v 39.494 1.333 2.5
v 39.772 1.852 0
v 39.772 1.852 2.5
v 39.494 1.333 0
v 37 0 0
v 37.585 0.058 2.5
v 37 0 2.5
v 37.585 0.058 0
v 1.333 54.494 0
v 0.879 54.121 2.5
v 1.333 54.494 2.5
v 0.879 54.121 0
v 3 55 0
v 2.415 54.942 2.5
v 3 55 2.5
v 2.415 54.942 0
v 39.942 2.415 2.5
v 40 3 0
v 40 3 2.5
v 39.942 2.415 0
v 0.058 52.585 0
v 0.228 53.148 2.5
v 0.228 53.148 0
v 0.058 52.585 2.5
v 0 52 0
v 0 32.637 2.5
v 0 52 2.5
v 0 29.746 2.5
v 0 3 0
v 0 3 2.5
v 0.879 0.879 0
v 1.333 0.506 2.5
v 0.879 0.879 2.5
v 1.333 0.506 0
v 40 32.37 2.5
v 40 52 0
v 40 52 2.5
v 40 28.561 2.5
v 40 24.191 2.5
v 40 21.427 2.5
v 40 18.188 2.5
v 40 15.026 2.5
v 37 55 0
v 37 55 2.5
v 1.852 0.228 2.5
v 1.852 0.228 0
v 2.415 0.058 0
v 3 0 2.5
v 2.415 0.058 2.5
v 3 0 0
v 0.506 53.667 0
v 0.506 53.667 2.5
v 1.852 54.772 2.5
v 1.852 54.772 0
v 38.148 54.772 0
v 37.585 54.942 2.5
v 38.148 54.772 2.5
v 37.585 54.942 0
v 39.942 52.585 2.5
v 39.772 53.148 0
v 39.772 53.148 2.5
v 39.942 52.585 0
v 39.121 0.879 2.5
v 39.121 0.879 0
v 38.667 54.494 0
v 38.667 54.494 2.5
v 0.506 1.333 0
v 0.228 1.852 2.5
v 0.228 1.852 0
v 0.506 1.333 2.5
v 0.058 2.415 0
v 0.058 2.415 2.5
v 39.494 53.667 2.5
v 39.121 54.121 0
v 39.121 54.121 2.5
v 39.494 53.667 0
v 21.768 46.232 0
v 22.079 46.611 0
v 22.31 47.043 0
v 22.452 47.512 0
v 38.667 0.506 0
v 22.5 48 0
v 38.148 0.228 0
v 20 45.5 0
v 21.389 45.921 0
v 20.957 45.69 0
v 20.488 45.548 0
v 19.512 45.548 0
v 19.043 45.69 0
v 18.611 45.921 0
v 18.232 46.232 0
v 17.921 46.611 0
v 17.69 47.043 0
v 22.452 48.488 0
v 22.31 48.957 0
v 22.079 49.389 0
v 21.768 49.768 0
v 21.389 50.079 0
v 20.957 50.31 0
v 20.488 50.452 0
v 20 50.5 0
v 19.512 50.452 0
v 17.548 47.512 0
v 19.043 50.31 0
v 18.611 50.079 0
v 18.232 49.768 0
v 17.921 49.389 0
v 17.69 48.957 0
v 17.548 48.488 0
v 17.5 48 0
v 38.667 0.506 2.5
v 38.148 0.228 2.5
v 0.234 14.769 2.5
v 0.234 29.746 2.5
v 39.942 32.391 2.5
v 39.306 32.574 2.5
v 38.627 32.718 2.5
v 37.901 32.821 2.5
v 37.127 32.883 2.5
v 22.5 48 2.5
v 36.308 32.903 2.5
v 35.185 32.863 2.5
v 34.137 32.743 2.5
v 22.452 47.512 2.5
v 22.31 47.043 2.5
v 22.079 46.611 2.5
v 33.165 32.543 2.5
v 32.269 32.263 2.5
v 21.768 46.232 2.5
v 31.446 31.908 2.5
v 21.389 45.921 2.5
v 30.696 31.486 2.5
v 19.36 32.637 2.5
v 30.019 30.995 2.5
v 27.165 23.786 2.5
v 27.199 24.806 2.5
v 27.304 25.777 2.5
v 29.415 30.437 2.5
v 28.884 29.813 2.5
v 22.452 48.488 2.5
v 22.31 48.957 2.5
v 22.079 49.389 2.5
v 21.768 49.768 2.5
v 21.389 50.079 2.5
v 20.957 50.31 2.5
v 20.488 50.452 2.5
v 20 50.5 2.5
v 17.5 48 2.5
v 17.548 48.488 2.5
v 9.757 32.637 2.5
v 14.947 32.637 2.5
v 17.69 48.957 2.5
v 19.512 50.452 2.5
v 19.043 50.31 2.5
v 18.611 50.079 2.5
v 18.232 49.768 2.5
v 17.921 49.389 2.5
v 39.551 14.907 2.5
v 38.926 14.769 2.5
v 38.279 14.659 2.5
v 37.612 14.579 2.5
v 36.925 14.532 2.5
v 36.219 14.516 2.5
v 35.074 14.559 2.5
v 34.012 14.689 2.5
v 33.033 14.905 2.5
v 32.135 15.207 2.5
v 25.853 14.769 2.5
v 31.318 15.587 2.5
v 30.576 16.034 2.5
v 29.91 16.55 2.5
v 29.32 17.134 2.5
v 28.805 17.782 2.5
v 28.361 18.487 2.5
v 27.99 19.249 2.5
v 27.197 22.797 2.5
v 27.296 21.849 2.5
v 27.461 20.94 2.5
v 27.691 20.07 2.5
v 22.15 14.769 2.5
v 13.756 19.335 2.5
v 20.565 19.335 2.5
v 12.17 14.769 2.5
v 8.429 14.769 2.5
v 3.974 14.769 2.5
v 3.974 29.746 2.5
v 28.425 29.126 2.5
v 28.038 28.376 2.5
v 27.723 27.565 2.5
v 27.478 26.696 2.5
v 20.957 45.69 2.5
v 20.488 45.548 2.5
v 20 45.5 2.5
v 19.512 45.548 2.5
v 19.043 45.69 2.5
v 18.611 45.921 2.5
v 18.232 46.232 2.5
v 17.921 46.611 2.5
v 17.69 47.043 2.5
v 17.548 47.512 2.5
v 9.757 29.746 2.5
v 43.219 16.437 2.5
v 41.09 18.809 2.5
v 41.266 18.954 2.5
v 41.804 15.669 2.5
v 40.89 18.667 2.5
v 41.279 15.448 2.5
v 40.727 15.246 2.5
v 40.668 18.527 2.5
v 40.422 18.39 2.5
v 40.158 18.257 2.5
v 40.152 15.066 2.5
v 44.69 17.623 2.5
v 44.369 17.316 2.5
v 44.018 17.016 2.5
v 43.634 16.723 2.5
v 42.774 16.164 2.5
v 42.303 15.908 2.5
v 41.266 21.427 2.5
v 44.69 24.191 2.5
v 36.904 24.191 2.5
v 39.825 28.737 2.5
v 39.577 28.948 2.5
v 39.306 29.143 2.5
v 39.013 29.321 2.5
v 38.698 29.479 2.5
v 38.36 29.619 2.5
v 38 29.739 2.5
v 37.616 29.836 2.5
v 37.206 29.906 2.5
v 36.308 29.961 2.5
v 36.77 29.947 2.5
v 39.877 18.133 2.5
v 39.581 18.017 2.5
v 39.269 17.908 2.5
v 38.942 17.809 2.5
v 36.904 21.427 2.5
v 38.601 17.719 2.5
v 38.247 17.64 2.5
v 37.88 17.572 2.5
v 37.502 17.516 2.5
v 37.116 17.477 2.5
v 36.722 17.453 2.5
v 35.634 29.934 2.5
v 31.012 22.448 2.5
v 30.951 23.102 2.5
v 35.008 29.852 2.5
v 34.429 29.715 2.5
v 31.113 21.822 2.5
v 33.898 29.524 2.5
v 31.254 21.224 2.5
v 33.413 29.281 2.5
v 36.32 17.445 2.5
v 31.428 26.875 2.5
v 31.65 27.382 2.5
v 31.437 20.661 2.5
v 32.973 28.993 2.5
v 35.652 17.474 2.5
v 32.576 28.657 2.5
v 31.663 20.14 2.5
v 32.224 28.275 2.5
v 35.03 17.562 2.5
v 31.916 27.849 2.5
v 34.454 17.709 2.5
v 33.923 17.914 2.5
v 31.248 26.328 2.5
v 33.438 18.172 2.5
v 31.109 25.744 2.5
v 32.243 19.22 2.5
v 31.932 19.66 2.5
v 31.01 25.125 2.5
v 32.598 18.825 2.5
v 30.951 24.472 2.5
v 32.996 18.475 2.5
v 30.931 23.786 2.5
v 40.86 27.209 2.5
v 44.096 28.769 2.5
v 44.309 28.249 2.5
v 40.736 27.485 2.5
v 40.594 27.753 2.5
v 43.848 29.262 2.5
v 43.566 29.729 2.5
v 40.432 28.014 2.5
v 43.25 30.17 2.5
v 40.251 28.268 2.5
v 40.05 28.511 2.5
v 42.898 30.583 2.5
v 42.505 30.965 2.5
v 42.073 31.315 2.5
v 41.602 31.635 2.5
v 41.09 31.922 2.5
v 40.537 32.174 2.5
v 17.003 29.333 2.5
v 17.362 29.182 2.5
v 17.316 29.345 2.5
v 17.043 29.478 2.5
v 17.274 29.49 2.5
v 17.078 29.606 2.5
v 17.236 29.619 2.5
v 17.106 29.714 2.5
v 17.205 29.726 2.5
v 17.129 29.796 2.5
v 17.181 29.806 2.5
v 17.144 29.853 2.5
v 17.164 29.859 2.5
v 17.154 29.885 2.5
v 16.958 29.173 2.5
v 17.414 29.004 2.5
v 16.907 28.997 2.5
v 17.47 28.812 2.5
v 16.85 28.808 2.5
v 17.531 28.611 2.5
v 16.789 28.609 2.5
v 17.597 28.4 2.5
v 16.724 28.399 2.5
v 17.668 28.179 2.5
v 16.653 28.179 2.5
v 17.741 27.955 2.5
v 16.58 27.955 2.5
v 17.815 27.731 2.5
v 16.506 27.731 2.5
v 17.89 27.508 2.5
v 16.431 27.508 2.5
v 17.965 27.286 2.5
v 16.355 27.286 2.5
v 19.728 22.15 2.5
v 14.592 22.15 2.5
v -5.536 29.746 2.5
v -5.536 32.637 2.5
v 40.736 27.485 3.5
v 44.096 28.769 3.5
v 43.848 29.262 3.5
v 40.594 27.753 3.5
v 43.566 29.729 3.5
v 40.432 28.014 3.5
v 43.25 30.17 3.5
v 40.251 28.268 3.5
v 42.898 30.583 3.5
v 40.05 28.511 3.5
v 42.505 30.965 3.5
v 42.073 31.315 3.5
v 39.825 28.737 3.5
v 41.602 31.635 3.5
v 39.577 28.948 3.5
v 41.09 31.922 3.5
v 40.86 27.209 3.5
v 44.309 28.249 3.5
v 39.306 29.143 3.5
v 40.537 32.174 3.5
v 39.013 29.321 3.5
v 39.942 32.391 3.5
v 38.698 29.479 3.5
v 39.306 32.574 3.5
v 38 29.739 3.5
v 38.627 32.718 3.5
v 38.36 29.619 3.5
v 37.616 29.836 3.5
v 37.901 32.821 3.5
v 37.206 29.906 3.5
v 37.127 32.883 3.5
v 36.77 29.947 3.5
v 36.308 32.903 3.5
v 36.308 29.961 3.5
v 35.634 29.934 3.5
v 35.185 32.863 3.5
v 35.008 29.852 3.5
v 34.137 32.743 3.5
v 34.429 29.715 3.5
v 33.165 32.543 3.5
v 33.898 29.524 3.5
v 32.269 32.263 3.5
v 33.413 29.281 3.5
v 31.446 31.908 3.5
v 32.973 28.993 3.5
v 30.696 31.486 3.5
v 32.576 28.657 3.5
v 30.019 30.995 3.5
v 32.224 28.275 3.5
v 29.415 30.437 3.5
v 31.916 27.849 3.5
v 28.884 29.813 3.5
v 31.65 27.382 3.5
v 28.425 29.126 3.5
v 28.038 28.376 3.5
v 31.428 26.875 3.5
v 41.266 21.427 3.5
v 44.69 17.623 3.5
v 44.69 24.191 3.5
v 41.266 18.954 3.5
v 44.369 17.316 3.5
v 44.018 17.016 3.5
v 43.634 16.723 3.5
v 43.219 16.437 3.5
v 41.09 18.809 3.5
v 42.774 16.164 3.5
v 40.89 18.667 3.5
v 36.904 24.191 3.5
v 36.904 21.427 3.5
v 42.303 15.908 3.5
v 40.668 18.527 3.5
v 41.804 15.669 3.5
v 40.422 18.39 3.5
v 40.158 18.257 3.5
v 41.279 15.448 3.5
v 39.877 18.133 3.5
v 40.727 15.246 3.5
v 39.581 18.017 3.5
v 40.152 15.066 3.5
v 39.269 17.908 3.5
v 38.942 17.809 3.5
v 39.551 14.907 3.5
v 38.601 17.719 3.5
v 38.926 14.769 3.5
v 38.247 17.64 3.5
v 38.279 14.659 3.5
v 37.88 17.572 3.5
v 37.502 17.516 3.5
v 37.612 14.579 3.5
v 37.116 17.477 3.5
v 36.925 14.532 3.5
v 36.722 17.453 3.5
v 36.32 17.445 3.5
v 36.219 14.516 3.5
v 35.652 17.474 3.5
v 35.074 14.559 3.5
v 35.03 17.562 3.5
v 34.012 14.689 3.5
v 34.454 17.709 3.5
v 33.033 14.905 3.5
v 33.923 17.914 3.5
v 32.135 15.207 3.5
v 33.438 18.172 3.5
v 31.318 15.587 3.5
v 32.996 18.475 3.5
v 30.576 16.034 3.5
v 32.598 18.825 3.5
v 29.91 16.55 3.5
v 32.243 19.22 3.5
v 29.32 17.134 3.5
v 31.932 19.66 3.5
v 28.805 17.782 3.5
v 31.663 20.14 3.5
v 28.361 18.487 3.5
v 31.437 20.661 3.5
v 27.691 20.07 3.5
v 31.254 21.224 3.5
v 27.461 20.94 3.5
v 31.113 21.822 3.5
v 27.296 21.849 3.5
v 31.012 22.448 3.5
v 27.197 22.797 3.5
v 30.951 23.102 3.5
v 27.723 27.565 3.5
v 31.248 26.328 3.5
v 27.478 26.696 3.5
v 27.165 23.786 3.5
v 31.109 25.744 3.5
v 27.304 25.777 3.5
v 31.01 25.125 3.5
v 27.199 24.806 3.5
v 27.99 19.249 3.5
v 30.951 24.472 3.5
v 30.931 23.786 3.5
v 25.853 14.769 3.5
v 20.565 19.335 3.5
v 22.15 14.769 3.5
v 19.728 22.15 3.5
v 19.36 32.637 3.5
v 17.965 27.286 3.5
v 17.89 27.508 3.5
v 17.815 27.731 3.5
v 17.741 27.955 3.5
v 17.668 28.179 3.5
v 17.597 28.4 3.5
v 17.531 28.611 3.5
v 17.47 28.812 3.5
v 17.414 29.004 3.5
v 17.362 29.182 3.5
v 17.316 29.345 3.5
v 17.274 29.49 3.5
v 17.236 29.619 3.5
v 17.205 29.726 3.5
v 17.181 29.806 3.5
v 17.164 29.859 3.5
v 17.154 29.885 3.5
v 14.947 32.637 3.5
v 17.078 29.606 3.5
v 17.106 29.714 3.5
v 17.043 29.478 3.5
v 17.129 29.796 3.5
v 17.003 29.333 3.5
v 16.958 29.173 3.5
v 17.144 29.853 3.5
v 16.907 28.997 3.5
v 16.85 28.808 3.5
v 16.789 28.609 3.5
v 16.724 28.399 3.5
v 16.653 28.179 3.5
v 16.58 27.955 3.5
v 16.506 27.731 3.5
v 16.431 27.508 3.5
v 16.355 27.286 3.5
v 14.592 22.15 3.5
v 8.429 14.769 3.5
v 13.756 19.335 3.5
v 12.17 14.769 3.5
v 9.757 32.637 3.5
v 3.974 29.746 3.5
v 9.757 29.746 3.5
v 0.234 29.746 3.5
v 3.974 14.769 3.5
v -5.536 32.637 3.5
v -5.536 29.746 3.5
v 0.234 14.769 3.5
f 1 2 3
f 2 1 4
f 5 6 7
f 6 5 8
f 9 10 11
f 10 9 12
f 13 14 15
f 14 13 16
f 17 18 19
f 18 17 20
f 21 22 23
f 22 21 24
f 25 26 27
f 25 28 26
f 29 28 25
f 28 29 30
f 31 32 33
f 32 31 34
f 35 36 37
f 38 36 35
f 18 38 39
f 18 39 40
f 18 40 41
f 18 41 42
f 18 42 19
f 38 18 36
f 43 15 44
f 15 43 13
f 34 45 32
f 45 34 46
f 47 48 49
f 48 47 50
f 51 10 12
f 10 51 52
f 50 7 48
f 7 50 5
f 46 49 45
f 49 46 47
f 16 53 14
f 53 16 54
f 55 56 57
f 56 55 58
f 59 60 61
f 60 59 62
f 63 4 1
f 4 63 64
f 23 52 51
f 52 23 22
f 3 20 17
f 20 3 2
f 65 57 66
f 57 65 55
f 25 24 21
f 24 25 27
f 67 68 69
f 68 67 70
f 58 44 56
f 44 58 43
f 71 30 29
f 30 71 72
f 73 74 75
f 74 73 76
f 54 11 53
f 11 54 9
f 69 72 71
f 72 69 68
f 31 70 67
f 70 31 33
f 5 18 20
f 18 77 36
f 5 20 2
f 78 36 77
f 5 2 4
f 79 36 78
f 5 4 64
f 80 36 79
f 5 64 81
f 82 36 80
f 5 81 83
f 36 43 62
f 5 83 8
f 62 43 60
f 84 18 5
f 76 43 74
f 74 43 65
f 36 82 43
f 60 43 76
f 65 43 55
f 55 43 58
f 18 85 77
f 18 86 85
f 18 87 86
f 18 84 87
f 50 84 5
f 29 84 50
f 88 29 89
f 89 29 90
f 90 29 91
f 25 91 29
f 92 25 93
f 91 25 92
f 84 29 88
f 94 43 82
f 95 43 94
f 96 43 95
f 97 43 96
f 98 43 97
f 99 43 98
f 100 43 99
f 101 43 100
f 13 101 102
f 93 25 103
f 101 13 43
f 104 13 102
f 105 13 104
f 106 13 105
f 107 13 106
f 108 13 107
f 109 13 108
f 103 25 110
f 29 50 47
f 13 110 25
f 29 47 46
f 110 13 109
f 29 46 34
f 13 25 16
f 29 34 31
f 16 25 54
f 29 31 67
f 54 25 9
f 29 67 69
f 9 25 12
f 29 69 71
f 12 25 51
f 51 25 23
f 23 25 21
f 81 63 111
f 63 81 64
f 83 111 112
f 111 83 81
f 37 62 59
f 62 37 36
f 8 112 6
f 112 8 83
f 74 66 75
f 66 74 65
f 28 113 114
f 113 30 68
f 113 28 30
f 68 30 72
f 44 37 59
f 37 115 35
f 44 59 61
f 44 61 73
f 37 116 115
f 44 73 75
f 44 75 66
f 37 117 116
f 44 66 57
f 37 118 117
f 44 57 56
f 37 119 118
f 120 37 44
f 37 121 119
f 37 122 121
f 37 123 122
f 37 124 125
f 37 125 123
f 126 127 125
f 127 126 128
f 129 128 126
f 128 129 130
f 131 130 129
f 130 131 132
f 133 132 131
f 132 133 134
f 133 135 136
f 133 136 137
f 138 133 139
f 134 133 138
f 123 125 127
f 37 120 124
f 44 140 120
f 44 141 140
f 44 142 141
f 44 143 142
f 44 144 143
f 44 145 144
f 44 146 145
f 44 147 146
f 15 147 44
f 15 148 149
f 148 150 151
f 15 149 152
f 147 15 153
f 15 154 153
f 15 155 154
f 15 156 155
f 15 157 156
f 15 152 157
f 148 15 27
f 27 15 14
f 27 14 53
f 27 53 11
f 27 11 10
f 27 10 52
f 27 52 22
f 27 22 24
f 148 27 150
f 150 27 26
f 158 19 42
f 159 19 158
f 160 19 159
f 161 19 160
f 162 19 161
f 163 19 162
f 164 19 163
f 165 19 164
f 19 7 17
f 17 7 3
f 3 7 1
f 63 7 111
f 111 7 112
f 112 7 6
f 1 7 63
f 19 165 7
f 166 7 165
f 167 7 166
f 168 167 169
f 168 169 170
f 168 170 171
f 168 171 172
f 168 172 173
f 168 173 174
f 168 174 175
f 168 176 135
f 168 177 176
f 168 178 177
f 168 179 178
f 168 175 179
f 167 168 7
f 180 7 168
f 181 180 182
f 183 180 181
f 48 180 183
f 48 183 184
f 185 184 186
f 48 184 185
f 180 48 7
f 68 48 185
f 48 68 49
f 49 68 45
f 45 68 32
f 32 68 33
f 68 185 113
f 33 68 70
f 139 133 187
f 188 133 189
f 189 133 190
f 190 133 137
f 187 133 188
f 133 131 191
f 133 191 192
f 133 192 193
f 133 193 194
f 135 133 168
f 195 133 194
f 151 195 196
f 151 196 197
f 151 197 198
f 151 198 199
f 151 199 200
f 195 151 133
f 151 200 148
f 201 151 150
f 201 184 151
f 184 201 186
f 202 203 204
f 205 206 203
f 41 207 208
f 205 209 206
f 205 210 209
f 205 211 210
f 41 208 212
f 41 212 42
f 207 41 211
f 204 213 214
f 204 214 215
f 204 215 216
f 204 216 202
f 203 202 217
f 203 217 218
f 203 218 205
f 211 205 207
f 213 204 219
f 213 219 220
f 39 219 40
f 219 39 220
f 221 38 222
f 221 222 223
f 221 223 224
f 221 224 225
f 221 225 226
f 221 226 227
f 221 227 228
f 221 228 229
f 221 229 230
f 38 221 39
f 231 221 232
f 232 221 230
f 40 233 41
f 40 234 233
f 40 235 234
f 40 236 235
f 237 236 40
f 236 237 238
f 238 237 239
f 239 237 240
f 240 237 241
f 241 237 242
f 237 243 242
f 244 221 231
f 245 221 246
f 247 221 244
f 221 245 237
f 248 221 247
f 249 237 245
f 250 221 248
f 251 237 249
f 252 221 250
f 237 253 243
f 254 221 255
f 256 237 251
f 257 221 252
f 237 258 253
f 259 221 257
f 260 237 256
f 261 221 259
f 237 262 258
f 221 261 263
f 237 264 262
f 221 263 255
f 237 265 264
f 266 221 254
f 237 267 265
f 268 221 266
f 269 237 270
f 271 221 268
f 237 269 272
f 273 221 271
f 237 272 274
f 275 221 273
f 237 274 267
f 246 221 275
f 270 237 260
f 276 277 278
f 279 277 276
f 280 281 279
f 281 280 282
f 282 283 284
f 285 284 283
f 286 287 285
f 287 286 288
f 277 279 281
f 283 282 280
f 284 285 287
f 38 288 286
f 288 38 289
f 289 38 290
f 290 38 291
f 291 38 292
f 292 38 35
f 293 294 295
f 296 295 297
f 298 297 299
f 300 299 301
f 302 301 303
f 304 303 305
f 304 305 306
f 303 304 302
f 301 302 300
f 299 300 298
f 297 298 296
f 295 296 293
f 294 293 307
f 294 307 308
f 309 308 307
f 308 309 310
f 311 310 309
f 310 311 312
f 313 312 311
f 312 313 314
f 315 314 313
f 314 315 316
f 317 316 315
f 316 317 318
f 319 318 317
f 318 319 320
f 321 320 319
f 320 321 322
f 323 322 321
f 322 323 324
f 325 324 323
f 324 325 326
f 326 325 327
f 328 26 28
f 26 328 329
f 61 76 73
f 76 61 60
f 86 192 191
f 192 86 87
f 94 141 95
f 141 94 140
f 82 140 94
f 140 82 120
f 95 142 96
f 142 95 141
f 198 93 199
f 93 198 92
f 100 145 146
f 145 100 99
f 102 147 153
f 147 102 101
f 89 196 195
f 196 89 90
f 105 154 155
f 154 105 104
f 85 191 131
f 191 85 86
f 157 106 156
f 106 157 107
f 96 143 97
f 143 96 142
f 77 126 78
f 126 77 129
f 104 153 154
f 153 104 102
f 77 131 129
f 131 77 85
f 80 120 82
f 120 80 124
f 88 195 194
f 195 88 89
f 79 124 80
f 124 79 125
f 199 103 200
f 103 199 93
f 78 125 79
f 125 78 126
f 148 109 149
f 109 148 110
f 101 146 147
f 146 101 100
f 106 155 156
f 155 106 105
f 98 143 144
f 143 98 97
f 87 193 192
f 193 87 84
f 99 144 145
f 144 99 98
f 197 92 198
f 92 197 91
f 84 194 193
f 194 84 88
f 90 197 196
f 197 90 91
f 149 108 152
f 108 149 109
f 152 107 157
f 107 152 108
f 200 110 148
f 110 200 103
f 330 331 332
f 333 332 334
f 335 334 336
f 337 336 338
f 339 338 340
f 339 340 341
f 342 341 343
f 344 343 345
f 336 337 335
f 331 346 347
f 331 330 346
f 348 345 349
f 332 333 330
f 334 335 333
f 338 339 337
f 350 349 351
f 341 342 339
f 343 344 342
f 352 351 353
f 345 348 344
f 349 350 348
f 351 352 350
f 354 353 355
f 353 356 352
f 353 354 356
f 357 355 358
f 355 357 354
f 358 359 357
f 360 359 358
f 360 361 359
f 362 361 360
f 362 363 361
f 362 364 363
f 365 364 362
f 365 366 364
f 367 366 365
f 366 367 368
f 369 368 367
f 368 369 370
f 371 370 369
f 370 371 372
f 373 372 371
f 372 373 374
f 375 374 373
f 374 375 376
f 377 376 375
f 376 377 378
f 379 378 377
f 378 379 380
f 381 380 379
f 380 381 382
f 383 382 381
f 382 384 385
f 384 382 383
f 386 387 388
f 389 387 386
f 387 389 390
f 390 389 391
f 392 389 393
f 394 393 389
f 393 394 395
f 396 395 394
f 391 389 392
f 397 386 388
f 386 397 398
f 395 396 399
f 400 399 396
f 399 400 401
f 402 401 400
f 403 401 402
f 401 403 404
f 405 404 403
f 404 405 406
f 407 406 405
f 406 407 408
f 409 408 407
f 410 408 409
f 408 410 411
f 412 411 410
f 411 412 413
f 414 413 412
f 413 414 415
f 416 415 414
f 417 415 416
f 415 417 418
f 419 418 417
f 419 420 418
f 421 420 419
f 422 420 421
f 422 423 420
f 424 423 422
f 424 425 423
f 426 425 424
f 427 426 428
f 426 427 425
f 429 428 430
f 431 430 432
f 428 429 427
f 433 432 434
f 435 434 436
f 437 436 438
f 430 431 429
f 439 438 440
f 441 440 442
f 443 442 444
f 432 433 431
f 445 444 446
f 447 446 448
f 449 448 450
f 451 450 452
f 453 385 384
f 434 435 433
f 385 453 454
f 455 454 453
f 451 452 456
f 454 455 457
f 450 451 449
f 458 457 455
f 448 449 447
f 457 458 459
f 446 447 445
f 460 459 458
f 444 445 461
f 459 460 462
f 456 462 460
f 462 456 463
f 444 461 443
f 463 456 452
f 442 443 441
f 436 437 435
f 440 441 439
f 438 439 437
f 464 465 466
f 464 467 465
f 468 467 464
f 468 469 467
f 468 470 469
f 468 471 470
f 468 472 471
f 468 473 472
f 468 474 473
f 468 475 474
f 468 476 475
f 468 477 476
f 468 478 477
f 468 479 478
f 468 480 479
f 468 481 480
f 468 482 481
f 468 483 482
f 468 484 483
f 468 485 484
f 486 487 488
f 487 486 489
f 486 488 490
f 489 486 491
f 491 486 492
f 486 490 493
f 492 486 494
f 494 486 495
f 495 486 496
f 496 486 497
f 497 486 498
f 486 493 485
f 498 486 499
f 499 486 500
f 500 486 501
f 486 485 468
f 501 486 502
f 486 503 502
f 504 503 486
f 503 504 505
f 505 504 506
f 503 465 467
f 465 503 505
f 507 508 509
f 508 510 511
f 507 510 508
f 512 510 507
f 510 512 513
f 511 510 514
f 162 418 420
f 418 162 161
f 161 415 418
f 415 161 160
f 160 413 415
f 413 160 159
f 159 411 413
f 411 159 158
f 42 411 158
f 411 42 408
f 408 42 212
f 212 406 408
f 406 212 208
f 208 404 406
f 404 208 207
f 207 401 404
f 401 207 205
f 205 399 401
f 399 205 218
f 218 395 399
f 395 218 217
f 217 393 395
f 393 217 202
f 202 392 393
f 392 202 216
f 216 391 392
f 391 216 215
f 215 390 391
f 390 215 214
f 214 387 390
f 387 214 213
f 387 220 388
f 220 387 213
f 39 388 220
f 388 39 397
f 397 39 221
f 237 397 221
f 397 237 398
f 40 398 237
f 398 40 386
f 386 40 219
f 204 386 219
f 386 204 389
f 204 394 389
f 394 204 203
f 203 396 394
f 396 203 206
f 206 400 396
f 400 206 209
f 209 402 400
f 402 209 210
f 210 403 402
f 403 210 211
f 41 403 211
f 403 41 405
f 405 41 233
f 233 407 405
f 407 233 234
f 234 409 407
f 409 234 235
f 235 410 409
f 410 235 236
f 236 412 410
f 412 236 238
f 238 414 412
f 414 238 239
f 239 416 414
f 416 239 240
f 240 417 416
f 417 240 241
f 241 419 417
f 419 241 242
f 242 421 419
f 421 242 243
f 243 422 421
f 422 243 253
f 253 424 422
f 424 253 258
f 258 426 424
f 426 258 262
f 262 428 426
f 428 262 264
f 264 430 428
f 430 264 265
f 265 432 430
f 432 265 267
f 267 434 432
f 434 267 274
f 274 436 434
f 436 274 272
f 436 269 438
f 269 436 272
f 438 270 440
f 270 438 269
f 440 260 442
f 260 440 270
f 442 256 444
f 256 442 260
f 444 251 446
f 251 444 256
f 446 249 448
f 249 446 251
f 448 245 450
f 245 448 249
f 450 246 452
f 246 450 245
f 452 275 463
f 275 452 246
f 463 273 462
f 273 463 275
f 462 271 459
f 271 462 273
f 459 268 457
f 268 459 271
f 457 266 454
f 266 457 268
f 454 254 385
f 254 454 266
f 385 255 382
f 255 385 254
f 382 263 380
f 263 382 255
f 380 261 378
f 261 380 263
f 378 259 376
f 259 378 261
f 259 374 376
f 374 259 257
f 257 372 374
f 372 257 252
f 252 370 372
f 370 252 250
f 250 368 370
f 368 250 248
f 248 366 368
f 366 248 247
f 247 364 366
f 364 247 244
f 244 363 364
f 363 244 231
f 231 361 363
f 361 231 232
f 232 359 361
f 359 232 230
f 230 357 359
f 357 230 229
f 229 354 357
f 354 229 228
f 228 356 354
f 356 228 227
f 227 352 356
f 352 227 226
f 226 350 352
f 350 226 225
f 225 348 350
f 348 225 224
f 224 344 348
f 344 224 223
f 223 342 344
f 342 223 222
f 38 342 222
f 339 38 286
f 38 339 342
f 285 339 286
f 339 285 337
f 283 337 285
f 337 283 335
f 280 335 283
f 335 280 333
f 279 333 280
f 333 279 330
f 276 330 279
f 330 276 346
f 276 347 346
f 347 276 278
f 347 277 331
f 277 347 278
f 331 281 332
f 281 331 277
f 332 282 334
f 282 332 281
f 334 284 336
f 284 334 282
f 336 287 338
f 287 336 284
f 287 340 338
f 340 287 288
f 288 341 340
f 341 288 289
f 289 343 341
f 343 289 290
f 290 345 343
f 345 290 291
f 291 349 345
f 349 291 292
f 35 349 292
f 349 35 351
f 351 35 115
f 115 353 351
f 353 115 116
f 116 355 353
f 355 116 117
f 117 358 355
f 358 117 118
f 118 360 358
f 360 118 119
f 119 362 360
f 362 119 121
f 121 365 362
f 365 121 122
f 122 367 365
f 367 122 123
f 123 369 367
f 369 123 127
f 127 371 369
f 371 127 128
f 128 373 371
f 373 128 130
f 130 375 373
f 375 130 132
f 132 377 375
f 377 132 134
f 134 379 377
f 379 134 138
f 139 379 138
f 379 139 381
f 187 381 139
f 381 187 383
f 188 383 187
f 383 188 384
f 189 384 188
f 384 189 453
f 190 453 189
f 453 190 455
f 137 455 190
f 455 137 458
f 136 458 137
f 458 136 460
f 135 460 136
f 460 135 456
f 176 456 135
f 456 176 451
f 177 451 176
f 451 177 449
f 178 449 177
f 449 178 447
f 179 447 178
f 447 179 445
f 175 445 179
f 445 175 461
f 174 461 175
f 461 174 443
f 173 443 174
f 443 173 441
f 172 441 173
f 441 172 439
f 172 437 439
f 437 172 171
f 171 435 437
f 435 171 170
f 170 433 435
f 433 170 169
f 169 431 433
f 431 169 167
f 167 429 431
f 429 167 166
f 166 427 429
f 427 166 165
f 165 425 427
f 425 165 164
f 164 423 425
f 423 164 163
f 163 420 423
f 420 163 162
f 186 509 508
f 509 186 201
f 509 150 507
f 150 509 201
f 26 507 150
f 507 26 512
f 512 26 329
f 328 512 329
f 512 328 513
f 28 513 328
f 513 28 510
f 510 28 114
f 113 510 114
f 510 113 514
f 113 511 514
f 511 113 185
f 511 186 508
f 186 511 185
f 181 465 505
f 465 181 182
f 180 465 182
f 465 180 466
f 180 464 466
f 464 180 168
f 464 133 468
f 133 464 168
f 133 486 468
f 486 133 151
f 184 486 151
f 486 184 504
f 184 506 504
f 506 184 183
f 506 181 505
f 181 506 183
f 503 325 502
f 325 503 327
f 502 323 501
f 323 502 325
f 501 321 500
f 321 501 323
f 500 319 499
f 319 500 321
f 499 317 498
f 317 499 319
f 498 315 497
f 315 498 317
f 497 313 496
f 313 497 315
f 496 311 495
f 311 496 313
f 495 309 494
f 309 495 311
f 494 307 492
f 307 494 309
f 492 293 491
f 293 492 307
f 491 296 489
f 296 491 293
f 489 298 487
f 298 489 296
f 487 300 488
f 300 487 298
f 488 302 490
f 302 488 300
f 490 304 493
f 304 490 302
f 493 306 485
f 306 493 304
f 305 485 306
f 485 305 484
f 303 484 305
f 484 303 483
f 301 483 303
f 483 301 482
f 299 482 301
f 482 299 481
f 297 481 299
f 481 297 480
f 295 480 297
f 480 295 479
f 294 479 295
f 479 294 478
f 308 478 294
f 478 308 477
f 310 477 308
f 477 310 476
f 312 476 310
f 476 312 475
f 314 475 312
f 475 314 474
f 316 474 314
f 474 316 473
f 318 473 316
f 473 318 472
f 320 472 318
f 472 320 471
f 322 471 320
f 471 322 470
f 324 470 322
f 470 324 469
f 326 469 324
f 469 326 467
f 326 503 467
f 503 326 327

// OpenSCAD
// DAVIS — Parametric Tag with lanyard hole

tag_text   = "TAG";
width      = 40;
height     = 55;
depth      = 2.5;
text_depth = 1.0;
font_size  = 0;
border     = 3;
corner_r   = 3;
hole_d     = 5;     // lanyard hole diameter
hole_y     = 7;     // distance from top edge to hole center

_font_size = font_size > 0 ? font_size : (width - border * 2) * 0.55;

module rounded_rect(w, h, d, r) {
    hull() {
        translate([ r,  r, 0]) cylinder(r=r, h=d, $fn=32);
        translate([w-r,  r, 0]) cylinder(r=r, h=d, $fn=32);
        translate([ r, h-r, 0]) cylinder(r=r, h=d, $fn=32);
        translate([w-r, h-r, 0]) cylinder(r=r, h=d, $fn=32);
    }
}

difference() {
    rounded_rect(width, height, depth, corner_r);
    // Lanyard hole at top
    translate([width/2, height - hole_y, -0.1])
        cylinder(d=hole_d, h=depth+0.2, $fn=32);
}

// Embossed text (centered vertically below hole area)
translate([width/2, (height - hole_y*2) / 2 + border, depth])
    linear_extrude(height=text_depth)
        text(tag_text,
             size=_font_size,
             font="Liberation Sans:style=Bold",
             halign="center",
             valign="center");
